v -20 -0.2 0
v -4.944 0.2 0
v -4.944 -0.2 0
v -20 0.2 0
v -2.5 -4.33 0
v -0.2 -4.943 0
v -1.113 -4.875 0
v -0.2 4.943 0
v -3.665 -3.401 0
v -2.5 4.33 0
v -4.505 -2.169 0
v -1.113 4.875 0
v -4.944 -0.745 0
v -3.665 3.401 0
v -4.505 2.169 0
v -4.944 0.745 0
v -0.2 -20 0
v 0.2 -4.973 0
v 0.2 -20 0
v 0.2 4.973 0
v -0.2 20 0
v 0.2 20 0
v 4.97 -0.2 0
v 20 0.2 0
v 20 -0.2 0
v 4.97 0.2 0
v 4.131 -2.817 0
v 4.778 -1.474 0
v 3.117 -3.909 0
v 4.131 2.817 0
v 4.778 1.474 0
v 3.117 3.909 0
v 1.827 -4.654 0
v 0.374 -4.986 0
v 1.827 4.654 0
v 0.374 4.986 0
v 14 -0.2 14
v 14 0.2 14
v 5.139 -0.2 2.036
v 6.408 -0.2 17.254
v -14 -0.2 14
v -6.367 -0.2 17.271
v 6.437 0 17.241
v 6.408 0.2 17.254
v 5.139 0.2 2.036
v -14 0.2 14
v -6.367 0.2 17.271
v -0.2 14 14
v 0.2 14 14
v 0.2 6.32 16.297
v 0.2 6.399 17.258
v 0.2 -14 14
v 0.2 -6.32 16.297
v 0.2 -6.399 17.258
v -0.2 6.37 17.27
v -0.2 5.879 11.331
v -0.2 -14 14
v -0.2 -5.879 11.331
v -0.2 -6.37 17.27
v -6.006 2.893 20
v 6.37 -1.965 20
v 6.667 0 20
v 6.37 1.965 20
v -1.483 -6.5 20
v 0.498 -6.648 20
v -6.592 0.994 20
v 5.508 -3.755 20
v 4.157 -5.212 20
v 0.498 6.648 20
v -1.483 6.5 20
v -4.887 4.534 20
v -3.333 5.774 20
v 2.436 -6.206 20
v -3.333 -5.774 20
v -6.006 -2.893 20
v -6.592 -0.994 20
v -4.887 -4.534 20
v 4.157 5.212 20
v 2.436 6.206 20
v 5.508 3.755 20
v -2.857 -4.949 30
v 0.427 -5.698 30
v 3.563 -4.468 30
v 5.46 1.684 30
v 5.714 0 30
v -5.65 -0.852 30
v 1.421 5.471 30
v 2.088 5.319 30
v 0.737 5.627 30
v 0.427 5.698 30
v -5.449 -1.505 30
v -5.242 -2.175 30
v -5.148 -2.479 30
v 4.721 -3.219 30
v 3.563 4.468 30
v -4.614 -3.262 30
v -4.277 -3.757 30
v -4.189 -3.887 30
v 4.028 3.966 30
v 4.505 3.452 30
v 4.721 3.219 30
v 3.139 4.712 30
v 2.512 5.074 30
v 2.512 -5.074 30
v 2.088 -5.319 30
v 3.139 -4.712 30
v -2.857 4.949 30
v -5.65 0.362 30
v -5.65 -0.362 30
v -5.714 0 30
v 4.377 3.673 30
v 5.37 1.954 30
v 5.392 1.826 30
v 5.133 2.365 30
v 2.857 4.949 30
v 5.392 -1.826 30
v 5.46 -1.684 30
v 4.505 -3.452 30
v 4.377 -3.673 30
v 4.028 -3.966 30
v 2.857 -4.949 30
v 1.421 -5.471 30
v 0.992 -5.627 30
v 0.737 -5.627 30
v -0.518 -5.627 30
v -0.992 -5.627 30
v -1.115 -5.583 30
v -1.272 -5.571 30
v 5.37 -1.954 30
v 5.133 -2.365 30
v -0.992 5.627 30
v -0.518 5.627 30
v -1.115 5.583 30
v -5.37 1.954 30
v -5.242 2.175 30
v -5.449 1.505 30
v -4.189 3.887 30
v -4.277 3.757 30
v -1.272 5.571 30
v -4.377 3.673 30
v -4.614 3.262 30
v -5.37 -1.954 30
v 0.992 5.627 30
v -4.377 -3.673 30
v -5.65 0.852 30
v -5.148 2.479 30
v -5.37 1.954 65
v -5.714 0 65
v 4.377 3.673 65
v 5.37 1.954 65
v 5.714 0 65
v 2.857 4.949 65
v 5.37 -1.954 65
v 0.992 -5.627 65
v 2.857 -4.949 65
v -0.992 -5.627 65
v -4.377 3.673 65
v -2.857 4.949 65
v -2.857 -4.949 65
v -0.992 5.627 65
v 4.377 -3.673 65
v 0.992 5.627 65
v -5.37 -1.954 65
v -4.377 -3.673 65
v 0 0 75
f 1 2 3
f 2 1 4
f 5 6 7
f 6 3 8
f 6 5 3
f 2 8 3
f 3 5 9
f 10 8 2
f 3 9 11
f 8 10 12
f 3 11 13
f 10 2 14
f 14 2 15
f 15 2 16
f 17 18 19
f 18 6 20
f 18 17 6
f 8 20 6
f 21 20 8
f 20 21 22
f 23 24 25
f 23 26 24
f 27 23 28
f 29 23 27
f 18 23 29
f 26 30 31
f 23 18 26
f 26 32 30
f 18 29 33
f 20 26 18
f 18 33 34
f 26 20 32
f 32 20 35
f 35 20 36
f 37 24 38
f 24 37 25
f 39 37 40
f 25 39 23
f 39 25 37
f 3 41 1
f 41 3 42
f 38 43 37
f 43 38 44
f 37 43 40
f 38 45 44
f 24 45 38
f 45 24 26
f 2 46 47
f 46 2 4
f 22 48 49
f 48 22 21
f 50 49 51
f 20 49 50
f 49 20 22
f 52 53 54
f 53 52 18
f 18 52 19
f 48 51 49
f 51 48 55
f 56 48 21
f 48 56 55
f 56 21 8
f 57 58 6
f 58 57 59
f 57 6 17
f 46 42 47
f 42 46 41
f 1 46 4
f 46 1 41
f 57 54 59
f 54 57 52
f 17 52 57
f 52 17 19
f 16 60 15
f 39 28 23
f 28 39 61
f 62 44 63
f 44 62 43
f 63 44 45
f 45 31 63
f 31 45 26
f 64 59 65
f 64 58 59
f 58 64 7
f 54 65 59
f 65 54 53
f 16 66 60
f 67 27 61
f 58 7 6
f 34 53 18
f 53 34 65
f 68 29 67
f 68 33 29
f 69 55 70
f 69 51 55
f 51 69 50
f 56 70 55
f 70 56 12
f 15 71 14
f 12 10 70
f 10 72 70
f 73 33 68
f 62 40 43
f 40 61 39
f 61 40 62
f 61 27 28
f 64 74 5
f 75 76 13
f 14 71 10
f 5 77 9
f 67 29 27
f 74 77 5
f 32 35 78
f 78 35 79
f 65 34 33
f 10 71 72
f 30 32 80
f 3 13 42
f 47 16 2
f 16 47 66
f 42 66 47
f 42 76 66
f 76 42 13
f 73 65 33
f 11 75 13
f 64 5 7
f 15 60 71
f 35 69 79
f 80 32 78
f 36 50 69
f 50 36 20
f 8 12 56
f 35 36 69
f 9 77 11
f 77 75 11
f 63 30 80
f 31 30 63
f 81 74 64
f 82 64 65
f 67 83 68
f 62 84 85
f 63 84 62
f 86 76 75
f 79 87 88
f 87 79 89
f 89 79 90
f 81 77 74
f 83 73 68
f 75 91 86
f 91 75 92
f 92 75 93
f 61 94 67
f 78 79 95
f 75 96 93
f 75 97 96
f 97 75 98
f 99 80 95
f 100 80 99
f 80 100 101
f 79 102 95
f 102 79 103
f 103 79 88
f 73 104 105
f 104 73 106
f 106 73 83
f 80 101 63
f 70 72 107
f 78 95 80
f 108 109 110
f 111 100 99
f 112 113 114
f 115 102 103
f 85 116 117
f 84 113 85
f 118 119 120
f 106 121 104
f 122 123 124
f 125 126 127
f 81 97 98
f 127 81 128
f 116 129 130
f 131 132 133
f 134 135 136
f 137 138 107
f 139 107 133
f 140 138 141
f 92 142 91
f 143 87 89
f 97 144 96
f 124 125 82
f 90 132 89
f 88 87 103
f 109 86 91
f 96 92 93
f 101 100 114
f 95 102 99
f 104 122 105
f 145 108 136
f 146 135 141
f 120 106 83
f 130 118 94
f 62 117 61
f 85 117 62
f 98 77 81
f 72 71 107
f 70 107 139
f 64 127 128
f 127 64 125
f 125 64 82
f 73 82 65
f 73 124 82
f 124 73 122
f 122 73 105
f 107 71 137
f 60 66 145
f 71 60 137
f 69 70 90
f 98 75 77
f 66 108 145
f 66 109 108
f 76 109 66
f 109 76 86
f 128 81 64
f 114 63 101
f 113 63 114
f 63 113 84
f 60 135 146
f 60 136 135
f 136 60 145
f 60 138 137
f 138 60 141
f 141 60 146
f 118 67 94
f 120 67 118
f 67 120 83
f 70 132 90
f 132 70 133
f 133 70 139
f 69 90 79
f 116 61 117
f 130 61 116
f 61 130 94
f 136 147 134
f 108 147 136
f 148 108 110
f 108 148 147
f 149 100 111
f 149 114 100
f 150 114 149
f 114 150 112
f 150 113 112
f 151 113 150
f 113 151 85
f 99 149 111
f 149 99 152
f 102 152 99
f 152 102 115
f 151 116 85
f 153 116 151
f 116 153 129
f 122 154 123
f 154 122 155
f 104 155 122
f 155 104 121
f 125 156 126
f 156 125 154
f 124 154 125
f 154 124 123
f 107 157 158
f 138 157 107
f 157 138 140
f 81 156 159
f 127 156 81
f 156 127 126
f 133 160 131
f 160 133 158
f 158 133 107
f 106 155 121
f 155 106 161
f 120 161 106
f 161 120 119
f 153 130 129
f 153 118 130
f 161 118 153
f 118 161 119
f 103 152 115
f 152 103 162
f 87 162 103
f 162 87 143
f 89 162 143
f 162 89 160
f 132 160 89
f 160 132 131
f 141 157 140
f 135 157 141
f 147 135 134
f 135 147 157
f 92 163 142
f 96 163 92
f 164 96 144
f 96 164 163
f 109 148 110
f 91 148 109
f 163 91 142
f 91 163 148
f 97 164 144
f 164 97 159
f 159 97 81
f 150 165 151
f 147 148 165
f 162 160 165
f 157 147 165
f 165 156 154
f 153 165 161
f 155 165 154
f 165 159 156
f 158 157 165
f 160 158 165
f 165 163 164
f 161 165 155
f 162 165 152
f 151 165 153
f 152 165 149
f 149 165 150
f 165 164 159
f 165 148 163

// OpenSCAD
module wing(scale=10) {
	rotate([90, 0, 0])
	linear_extrude(height = scale*0.02, center = true)
	polygon(points=[[0, 0], [0, scale], [scale*0.7, scale*0.7], [scale, 0]]);
}

module rocket(scale=10) {
	rotate([0, 0, 0])
	wing(scale);

	rotate([0, 0, 90])
	wing(scale);

	rotate([0, 0, 180])
	wing(scale);

	rotate([0, 0, 270])
	wing(scale);

	color("blue", 0.8)
	cylinder(h = scale, r1=scale/4, r2=scale/3);

	mid_height = scale/2;
	mid_width  = scale/3.5;
	translate([0, 0, scale])
	color("green",0.8)
	cylinder(h = mid_height, r1=scale/3, r2=mid_width);

	long_height = scale+mid_height;
	translate([0, 0, long_height])
	color("blue", 0.8)
	cylinder(h = scale*1.75, r1=mid_width, r2=scale/3.5);

	cone_height = scale*1.75+long_height;
	translate([0, 0, cone_height])
	color("black",0.8)
	cylinder(h = (scale/2), r1=mid_width, r2=0);

}

rocket(20);
